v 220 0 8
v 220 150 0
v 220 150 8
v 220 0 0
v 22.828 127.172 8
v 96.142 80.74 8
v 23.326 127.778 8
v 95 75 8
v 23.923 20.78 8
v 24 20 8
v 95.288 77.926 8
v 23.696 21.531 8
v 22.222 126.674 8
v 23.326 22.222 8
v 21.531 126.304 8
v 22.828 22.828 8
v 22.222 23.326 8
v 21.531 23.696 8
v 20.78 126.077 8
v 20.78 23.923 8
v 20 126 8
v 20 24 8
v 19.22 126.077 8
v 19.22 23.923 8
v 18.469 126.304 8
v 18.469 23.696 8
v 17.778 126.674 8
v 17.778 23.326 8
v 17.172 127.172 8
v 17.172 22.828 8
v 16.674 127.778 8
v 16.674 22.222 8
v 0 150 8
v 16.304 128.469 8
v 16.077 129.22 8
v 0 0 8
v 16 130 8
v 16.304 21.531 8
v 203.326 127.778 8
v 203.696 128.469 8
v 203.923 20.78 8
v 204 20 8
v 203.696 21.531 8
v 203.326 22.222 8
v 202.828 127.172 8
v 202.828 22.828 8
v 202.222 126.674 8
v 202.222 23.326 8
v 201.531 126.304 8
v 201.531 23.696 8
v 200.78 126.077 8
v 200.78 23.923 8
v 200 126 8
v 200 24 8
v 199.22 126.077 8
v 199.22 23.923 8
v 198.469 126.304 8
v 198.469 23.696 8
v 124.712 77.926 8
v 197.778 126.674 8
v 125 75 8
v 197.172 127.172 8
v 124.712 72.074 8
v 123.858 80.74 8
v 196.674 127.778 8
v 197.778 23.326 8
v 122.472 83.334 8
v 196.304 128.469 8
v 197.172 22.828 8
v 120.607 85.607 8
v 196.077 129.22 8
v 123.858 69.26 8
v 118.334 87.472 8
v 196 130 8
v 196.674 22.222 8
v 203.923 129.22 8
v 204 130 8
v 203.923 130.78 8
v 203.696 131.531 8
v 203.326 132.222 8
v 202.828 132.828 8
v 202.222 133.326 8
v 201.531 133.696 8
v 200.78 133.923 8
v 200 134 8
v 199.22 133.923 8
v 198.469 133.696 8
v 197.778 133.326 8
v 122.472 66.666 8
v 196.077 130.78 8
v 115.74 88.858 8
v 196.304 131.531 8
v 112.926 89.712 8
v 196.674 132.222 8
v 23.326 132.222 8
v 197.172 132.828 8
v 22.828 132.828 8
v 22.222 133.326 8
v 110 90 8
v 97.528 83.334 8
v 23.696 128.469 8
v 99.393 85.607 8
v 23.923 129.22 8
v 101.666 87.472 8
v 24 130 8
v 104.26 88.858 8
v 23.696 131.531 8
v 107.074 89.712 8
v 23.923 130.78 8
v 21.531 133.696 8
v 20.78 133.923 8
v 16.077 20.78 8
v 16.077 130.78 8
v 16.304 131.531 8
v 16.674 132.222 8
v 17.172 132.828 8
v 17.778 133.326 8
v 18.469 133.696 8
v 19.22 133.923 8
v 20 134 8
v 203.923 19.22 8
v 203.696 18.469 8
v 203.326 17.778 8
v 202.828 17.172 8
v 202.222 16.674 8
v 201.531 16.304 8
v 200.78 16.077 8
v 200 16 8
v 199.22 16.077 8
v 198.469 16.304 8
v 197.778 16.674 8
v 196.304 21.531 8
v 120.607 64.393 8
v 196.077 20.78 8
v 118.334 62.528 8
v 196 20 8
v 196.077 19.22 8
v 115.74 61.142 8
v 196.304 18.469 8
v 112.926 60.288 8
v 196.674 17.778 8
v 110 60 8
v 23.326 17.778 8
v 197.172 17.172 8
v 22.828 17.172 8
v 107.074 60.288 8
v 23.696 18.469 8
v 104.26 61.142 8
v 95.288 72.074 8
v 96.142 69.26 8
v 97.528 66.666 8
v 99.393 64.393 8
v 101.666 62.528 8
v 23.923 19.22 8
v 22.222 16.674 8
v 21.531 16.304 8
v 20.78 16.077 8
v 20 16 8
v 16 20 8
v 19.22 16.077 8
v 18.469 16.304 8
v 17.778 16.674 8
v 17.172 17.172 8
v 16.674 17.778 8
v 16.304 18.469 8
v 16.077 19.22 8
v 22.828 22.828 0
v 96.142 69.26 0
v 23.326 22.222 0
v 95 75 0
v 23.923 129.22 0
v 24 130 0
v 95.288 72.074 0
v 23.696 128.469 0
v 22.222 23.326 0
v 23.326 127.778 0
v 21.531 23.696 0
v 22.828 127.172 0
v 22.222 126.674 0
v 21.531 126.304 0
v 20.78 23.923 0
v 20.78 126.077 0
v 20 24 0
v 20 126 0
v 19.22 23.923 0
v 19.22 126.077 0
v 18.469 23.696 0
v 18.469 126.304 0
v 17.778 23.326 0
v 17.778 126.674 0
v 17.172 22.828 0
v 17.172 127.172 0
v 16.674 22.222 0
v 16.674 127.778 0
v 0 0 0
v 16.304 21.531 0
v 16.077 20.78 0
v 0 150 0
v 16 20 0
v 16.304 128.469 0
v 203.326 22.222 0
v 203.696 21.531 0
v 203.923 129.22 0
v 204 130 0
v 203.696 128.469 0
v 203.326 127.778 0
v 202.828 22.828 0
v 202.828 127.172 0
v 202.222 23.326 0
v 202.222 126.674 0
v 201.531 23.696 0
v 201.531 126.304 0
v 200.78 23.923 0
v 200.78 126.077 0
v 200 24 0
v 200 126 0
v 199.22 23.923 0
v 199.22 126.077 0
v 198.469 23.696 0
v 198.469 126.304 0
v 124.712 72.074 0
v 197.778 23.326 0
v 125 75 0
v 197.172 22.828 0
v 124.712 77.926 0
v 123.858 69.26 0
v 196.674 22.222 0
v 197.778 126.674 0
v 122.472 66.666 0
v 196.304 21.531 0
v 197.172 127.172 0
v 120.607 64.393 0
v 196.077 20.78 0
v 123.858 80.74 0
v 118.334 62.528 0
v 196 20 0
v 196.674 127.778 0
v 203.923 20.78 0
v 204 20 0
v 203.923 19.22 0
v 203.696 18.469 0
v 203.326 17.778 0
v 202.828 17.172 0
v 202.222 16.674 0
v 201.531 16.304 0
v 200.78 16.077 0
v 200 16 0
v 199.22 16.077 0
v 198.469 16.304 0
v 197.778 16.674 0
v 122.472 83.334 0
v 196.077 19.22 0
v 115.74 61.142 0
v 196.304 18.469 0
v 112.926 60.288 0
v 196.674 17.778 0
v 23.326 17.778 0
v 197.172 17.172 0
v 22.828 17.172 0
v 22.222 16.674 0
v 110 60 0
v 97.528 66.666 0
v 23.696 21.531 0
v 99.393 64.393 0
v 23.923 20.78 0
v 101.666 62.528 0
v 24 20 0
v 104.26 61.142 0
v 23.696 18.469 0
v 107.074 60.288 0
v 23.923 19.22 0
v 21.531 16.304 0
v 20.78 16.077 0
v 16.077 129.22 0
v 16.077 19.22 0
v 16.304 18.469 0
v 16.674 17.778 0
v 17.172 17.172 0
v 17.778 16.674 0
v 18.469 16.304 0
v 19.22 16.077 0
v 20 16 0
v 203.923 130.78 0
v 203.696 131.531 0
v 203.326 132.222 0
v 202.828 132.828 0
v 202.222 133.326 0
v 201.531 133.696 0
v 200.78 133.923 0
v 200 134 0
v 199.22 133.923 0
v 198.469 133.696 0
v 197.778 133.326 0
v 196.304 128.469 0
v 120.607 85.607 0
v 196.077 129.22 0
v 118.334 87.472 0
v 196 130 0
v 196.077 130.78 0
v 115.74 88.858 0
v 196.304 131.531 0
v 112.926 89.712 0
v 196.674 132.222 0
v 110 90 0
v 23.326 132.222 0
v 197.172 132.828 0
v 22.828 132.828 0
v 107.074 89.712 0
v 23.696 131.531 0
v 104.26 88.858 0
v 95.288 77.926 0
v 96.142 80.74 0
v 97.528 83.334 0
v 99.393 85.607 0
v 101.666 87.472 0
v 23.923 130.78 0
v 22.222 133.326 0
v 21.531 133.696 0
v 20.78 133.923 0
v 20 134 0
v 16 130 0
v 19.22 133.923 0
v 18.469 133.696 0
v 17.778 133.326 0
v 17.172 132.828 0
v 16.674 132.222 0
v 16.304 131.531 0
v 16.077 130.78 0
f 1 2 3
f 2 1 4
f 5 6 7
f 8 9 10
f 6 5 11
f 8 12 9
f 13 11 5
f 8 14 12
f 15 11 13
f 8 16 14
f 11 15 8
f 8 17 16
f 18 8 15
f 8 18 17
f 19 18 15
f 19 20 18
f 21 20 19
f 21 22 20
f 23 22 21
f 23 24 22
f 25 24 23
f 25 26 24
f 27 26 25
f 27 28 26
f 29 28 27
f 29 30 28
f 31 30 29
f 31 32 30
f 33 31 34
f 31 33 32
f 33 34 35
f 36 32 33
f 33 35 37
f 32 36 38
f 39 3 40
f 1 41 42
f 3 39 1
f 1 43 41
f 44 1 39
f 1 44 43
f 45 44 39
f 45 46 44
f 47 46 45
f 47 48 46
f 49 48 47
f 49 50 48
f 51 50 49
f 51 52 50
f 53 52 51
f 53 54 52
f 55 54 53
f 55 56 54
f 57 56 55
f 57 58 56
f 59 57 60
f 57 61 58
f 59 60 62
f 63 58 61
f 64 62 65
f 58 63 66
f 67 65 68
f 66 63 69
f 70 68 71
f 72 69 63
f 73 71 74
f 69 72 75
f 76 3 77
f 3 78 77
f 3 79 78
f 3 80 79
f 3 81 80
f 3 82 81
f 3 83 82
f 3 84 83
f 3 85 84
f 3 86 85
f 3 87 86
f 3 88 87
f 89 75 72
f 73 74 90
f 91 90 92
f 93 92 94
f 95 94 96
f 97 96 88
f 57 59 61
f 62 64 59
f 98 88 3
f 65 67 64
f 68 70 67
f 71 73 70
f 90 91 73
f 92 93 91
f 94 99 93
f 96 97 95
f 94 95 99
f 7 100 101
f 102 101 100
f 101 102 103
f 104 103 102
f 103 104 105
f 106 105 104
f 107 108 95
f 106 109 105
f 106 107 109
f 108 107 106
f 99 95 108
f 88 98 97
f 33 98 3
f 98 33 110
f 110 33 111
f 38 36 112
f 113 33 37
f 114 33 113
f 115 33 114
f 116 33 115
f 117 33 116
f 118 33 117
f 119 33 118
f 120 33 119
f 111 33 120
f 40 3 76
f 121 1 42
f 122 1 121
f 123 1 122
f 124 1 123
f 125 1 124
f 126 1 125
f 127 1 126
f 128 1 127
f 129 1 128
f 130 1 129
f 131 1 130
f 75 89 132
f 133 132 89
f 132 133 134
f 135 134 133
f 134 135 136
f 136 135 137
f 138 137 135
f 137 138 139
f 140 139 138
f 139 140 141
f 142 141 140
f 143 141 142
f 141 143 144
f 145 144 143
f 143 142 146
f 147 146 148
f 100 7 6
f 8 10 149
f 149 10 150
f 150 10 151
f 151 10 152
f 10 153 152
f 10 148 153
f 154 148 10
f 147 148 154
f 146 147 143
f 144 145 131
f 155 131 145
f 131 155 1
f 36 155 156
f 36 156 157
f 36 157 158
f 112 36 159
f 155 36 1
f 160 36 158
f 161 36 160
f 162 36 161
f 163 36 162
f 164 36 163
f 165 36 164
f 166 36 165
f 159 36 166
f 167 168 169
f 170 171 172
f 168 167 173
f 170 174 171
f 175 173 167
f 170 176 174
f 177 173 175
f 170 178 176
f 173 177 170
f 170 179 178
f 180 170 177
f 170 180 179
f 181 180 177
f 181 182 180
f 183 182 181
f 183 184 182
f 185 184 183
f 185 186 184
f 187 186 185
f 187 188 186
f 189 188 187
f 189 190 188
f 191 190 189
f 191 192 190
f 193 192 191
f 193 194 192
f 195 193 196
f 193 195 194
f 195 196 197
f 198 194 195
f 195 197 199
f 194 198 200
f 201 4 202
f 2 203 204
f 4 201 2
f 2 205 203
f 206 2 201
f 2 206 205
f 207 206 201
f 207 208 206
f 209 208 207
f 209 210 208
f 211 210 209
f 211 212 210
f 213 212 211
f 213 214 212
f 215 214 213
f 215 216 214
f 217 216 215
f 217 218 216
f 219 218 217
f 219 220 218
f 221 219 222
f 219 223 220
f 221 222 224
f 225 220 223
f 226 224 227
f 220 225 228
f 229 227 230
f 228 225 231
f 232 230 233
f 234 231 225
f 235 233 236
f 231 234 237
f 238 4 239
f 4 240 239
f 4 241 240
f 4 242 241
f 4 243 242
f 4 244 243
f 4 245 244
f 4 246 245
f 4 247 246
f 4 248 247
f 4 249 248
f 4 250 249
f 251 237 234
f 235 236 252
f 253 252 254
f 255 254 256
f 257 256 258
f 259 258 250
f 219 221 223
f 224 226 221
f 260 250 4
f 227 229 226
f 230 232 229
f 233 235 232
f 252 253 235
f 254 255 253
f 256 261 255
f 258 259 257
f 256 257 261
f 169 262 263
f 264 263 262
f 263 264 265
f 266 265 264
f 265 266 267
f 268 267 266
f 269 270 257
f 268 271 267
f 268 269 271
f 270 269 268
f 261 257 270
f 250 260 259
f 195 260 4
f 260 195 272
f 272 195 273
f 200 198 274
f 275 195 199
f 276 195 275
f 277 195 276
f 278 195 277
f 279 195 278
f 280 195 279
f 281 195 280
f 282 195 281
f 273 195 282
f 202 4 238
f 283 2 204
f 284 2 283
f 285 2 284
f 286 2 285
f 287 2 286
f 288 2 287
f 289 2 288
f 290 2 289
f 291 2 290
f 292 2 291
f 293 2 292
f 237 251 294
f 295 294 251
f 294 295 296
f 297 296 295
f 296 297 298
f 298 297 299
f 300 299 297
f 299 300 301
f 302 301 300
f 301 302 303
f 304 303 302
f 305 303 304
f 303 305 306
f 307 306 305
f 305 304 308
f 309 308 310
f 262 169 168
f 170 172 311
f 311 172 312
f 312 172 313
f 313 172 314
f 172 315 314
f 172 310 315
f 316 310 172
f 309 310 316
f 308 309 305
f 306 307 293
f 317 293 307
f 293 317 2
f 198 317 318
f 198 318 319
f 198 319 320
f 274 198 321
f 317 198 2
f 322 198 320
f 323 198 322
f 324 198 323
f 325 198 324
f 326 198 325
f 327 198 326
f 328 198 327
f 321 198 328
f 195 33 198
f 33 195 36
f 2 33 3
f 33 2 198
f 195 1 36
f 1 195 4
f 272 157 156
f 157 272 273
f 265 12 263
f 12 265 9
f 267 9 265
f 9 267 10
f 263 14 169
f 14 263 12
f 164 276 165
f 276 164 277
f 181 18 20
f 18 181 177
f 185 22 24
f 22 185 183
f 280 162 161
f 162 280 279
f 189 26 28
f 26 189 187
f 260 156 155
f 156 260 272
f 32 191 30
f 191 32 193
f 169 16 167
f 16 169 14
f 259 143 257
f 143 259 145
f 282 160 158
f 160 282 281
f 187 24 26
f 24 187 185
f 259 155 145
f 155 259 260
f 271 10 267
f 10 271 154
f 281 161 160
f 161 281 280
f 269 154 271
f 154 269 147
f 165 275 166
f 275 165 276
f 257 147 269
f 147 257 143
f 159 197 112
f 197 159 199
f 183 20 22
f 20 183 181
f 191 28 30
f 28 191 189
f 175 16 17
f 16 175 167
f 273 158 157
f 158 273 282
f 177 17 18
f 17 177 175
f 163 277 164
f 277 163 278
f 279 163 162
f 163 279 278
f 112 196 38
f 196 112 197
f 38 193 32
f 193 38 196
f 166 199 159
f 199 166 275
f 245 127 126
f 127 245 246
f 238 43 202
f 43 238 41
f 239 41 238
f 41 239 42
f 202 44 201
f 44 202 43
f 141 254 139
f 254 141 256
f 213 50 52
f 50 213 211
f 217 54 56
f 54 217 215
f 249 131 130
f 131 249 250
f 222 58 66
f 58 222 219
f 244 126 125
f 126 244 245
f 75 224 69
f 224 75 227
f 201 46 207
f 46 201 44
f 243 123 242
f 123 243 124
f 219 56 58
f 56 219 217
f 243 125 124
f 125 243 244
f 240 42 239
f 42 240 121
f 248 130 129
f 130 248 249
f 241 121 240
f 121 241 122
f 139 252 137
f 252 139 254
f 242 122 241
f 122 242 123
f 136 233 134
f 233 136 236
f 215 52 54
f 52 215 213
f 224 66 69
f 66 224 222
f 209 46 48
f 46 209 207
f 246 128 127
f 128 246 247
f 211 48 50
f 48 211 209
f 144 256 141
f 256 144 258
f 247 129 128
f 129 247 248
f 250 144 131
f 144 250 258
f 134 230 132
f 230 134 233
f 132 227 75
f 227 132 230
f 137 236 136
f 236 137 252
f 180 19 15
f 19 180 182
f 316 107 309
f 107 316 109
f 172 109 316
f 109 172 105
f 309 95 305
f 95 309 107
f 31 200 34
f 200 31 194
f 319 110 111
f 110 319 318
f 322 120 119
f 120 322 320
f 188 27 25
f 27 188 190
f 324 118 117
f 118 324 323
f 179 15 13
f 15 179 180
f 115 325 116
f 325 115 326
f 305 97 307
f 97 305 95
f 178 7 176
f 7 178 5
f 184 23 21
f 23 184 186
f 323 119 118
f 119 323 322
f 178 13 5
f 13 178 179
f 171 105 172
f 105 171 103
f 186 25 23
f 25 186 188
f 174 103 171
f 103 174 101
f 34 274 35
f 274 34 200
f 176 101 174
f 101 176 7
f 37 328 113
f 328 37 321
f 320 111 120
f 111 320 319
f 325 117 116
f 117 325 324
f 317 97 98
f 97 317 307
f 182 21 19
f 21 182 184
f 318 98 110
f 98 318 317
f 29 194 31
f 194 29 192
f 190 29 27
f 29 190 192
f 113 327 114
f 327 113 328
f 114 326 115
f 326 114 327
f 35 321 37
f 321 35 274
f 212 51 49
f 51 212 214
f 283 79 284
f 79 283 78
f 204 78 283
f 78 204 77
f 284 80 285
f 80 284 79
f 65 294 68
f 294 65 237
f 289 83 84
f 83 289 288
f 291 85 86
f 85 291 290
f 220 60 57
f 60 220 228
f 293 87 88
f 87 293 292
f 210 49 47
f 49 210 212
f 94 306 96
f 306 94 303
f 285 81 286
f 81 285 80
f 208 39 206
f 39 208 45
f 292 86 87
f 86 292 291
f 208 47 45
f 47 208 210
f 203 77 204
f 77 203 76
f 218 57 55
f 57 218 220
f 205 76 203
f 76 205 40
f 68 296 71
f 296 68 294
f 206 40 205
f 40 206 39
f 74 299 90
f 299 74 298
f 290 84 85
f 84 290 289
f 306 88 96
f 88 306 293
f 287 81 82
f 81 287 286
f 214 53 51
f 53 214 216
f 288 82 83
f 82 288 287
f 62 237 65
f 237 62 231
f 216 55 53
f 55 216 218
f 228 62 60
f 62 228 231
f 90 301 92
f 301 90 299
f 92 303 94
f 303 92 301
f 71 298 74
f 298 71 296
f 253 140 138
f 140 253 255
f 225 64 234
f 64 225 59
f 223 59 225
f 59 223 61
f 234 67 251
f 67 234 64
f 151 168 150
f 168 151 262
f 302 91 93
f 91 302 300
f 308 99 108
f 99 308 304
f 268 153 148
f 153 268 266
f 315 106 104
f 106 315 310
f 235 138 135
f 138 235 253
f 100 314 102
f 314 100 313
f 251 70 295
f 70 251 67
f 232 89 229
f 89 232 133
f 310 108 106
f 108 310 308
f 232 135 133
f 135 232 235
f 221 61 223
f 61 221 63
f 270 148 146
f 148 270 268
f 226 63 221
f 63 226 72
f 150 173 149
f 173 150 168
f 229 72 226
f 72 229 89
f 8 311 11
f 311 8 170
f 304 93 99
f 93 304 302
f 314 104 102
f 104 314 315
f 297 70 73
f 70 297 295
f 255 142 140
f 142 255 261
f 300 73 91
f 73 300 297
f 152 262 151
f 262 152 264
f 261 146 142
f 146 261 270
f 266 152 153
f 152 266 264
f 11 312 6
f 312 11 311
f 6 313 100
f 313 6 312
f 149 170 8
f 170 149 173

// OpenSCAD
$fn = 32;

// ----------------------------------------------------------------------
// Big plate: 200-250 mm adapter plate
// ----------------------------------------------------------------------

// --- parameters (mm) ---
plate_l = 220;            // plate length, X
plate_w = 150;            // plate width, Y
plate_t = 8;              // plate thickness, Z
corner_d = 8;             // corner hole diameter
corner_in = 20;           // corner hole inset from the edges
bore_d = 30;              // central bore

difference() {
  cube([plate_l, plate_w, plate_t]);
  translate([corner_in, corner_in, -1]) cylinder(h = plate_t + 2, d = corner_d);
  translate([plate_l - corner_in, corner_in, -1]) cylinder(h = plate_t + 2, d = corner_d);
  translate([corner_in, plate_w - corner_in, -1]) cylinder(h = plate_t + 2, d = corner_d);
  translate([plate_l - corner_in, plate_w - corner_in, -1]) cylinder(h = plate_t + 2, d = corner_d);
  translate([plate_l / 2, plate_w / 2, -1]) cylinder(h = plate_t + 2, d = bore_d);
}
